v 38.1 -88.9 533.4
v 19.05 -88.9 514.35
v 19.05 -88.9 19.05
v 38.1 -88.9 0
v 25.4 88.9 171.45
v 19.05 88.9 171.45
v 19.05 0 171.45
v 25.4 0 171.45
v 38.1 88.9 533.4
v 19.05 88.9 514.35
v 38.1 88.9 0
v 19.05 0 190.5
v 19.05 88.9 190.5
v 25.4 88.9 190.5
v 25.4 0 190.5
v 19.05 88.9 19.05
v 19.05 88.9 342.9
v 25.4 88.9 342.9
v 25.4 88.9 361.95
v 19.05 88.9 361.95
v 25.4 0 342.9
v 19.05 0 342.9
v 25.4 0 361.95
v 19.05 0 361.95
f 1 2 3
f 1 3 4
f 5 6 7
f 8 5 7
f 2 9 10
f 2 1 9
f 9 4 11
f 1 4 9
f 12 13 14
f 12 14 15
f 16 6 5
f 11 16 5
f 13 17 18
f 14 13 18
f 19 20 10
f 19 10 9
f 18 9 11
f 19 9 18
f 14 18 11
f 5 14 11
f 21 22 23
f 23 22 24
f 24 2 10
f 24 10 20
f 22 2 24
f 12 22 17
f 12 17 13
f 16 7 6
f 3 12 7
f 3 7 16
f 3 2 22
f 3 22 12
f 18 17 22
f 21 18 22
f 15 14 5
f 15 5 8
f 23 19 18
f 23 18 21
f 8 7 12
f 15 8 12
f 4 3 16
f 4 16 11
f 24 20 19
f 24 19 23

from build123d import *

# Parameters (mm, degrees)
F1_DEPTH = 88.9
F2_W     = 88.9
F2_H     = 19.05
F3_DEPTH = 6.35


with BuildPart() as f1:
    # F0 (on Front) → F1 (new body, symmetric)
    with BuildSketch(Plane.XZ):
        Polygon((19.05, 514.35), (19.05, 19.05), (38.1, 0), (38.1, 533.4), align=None)
    extrude(amount=F1_DEPTH, both=True)

    # F2 (on face) → F3 (cut)
    with BuildSketch(Plane(origin=(19.05, 0, 0), x_dir=(0, -1, 0), z_dir=(-1, 0, 0))):
        with Locations((-44.45, 180.975)):
            Rectangle(F2_W, F2_H)
        with Locations((-44.45, 352.425)):
            Rectangle(F2_W, F2_H)
    extrude(amount=-F3_DEPTH, mode=Mode.SUBTRACT)


solid = f1.part
